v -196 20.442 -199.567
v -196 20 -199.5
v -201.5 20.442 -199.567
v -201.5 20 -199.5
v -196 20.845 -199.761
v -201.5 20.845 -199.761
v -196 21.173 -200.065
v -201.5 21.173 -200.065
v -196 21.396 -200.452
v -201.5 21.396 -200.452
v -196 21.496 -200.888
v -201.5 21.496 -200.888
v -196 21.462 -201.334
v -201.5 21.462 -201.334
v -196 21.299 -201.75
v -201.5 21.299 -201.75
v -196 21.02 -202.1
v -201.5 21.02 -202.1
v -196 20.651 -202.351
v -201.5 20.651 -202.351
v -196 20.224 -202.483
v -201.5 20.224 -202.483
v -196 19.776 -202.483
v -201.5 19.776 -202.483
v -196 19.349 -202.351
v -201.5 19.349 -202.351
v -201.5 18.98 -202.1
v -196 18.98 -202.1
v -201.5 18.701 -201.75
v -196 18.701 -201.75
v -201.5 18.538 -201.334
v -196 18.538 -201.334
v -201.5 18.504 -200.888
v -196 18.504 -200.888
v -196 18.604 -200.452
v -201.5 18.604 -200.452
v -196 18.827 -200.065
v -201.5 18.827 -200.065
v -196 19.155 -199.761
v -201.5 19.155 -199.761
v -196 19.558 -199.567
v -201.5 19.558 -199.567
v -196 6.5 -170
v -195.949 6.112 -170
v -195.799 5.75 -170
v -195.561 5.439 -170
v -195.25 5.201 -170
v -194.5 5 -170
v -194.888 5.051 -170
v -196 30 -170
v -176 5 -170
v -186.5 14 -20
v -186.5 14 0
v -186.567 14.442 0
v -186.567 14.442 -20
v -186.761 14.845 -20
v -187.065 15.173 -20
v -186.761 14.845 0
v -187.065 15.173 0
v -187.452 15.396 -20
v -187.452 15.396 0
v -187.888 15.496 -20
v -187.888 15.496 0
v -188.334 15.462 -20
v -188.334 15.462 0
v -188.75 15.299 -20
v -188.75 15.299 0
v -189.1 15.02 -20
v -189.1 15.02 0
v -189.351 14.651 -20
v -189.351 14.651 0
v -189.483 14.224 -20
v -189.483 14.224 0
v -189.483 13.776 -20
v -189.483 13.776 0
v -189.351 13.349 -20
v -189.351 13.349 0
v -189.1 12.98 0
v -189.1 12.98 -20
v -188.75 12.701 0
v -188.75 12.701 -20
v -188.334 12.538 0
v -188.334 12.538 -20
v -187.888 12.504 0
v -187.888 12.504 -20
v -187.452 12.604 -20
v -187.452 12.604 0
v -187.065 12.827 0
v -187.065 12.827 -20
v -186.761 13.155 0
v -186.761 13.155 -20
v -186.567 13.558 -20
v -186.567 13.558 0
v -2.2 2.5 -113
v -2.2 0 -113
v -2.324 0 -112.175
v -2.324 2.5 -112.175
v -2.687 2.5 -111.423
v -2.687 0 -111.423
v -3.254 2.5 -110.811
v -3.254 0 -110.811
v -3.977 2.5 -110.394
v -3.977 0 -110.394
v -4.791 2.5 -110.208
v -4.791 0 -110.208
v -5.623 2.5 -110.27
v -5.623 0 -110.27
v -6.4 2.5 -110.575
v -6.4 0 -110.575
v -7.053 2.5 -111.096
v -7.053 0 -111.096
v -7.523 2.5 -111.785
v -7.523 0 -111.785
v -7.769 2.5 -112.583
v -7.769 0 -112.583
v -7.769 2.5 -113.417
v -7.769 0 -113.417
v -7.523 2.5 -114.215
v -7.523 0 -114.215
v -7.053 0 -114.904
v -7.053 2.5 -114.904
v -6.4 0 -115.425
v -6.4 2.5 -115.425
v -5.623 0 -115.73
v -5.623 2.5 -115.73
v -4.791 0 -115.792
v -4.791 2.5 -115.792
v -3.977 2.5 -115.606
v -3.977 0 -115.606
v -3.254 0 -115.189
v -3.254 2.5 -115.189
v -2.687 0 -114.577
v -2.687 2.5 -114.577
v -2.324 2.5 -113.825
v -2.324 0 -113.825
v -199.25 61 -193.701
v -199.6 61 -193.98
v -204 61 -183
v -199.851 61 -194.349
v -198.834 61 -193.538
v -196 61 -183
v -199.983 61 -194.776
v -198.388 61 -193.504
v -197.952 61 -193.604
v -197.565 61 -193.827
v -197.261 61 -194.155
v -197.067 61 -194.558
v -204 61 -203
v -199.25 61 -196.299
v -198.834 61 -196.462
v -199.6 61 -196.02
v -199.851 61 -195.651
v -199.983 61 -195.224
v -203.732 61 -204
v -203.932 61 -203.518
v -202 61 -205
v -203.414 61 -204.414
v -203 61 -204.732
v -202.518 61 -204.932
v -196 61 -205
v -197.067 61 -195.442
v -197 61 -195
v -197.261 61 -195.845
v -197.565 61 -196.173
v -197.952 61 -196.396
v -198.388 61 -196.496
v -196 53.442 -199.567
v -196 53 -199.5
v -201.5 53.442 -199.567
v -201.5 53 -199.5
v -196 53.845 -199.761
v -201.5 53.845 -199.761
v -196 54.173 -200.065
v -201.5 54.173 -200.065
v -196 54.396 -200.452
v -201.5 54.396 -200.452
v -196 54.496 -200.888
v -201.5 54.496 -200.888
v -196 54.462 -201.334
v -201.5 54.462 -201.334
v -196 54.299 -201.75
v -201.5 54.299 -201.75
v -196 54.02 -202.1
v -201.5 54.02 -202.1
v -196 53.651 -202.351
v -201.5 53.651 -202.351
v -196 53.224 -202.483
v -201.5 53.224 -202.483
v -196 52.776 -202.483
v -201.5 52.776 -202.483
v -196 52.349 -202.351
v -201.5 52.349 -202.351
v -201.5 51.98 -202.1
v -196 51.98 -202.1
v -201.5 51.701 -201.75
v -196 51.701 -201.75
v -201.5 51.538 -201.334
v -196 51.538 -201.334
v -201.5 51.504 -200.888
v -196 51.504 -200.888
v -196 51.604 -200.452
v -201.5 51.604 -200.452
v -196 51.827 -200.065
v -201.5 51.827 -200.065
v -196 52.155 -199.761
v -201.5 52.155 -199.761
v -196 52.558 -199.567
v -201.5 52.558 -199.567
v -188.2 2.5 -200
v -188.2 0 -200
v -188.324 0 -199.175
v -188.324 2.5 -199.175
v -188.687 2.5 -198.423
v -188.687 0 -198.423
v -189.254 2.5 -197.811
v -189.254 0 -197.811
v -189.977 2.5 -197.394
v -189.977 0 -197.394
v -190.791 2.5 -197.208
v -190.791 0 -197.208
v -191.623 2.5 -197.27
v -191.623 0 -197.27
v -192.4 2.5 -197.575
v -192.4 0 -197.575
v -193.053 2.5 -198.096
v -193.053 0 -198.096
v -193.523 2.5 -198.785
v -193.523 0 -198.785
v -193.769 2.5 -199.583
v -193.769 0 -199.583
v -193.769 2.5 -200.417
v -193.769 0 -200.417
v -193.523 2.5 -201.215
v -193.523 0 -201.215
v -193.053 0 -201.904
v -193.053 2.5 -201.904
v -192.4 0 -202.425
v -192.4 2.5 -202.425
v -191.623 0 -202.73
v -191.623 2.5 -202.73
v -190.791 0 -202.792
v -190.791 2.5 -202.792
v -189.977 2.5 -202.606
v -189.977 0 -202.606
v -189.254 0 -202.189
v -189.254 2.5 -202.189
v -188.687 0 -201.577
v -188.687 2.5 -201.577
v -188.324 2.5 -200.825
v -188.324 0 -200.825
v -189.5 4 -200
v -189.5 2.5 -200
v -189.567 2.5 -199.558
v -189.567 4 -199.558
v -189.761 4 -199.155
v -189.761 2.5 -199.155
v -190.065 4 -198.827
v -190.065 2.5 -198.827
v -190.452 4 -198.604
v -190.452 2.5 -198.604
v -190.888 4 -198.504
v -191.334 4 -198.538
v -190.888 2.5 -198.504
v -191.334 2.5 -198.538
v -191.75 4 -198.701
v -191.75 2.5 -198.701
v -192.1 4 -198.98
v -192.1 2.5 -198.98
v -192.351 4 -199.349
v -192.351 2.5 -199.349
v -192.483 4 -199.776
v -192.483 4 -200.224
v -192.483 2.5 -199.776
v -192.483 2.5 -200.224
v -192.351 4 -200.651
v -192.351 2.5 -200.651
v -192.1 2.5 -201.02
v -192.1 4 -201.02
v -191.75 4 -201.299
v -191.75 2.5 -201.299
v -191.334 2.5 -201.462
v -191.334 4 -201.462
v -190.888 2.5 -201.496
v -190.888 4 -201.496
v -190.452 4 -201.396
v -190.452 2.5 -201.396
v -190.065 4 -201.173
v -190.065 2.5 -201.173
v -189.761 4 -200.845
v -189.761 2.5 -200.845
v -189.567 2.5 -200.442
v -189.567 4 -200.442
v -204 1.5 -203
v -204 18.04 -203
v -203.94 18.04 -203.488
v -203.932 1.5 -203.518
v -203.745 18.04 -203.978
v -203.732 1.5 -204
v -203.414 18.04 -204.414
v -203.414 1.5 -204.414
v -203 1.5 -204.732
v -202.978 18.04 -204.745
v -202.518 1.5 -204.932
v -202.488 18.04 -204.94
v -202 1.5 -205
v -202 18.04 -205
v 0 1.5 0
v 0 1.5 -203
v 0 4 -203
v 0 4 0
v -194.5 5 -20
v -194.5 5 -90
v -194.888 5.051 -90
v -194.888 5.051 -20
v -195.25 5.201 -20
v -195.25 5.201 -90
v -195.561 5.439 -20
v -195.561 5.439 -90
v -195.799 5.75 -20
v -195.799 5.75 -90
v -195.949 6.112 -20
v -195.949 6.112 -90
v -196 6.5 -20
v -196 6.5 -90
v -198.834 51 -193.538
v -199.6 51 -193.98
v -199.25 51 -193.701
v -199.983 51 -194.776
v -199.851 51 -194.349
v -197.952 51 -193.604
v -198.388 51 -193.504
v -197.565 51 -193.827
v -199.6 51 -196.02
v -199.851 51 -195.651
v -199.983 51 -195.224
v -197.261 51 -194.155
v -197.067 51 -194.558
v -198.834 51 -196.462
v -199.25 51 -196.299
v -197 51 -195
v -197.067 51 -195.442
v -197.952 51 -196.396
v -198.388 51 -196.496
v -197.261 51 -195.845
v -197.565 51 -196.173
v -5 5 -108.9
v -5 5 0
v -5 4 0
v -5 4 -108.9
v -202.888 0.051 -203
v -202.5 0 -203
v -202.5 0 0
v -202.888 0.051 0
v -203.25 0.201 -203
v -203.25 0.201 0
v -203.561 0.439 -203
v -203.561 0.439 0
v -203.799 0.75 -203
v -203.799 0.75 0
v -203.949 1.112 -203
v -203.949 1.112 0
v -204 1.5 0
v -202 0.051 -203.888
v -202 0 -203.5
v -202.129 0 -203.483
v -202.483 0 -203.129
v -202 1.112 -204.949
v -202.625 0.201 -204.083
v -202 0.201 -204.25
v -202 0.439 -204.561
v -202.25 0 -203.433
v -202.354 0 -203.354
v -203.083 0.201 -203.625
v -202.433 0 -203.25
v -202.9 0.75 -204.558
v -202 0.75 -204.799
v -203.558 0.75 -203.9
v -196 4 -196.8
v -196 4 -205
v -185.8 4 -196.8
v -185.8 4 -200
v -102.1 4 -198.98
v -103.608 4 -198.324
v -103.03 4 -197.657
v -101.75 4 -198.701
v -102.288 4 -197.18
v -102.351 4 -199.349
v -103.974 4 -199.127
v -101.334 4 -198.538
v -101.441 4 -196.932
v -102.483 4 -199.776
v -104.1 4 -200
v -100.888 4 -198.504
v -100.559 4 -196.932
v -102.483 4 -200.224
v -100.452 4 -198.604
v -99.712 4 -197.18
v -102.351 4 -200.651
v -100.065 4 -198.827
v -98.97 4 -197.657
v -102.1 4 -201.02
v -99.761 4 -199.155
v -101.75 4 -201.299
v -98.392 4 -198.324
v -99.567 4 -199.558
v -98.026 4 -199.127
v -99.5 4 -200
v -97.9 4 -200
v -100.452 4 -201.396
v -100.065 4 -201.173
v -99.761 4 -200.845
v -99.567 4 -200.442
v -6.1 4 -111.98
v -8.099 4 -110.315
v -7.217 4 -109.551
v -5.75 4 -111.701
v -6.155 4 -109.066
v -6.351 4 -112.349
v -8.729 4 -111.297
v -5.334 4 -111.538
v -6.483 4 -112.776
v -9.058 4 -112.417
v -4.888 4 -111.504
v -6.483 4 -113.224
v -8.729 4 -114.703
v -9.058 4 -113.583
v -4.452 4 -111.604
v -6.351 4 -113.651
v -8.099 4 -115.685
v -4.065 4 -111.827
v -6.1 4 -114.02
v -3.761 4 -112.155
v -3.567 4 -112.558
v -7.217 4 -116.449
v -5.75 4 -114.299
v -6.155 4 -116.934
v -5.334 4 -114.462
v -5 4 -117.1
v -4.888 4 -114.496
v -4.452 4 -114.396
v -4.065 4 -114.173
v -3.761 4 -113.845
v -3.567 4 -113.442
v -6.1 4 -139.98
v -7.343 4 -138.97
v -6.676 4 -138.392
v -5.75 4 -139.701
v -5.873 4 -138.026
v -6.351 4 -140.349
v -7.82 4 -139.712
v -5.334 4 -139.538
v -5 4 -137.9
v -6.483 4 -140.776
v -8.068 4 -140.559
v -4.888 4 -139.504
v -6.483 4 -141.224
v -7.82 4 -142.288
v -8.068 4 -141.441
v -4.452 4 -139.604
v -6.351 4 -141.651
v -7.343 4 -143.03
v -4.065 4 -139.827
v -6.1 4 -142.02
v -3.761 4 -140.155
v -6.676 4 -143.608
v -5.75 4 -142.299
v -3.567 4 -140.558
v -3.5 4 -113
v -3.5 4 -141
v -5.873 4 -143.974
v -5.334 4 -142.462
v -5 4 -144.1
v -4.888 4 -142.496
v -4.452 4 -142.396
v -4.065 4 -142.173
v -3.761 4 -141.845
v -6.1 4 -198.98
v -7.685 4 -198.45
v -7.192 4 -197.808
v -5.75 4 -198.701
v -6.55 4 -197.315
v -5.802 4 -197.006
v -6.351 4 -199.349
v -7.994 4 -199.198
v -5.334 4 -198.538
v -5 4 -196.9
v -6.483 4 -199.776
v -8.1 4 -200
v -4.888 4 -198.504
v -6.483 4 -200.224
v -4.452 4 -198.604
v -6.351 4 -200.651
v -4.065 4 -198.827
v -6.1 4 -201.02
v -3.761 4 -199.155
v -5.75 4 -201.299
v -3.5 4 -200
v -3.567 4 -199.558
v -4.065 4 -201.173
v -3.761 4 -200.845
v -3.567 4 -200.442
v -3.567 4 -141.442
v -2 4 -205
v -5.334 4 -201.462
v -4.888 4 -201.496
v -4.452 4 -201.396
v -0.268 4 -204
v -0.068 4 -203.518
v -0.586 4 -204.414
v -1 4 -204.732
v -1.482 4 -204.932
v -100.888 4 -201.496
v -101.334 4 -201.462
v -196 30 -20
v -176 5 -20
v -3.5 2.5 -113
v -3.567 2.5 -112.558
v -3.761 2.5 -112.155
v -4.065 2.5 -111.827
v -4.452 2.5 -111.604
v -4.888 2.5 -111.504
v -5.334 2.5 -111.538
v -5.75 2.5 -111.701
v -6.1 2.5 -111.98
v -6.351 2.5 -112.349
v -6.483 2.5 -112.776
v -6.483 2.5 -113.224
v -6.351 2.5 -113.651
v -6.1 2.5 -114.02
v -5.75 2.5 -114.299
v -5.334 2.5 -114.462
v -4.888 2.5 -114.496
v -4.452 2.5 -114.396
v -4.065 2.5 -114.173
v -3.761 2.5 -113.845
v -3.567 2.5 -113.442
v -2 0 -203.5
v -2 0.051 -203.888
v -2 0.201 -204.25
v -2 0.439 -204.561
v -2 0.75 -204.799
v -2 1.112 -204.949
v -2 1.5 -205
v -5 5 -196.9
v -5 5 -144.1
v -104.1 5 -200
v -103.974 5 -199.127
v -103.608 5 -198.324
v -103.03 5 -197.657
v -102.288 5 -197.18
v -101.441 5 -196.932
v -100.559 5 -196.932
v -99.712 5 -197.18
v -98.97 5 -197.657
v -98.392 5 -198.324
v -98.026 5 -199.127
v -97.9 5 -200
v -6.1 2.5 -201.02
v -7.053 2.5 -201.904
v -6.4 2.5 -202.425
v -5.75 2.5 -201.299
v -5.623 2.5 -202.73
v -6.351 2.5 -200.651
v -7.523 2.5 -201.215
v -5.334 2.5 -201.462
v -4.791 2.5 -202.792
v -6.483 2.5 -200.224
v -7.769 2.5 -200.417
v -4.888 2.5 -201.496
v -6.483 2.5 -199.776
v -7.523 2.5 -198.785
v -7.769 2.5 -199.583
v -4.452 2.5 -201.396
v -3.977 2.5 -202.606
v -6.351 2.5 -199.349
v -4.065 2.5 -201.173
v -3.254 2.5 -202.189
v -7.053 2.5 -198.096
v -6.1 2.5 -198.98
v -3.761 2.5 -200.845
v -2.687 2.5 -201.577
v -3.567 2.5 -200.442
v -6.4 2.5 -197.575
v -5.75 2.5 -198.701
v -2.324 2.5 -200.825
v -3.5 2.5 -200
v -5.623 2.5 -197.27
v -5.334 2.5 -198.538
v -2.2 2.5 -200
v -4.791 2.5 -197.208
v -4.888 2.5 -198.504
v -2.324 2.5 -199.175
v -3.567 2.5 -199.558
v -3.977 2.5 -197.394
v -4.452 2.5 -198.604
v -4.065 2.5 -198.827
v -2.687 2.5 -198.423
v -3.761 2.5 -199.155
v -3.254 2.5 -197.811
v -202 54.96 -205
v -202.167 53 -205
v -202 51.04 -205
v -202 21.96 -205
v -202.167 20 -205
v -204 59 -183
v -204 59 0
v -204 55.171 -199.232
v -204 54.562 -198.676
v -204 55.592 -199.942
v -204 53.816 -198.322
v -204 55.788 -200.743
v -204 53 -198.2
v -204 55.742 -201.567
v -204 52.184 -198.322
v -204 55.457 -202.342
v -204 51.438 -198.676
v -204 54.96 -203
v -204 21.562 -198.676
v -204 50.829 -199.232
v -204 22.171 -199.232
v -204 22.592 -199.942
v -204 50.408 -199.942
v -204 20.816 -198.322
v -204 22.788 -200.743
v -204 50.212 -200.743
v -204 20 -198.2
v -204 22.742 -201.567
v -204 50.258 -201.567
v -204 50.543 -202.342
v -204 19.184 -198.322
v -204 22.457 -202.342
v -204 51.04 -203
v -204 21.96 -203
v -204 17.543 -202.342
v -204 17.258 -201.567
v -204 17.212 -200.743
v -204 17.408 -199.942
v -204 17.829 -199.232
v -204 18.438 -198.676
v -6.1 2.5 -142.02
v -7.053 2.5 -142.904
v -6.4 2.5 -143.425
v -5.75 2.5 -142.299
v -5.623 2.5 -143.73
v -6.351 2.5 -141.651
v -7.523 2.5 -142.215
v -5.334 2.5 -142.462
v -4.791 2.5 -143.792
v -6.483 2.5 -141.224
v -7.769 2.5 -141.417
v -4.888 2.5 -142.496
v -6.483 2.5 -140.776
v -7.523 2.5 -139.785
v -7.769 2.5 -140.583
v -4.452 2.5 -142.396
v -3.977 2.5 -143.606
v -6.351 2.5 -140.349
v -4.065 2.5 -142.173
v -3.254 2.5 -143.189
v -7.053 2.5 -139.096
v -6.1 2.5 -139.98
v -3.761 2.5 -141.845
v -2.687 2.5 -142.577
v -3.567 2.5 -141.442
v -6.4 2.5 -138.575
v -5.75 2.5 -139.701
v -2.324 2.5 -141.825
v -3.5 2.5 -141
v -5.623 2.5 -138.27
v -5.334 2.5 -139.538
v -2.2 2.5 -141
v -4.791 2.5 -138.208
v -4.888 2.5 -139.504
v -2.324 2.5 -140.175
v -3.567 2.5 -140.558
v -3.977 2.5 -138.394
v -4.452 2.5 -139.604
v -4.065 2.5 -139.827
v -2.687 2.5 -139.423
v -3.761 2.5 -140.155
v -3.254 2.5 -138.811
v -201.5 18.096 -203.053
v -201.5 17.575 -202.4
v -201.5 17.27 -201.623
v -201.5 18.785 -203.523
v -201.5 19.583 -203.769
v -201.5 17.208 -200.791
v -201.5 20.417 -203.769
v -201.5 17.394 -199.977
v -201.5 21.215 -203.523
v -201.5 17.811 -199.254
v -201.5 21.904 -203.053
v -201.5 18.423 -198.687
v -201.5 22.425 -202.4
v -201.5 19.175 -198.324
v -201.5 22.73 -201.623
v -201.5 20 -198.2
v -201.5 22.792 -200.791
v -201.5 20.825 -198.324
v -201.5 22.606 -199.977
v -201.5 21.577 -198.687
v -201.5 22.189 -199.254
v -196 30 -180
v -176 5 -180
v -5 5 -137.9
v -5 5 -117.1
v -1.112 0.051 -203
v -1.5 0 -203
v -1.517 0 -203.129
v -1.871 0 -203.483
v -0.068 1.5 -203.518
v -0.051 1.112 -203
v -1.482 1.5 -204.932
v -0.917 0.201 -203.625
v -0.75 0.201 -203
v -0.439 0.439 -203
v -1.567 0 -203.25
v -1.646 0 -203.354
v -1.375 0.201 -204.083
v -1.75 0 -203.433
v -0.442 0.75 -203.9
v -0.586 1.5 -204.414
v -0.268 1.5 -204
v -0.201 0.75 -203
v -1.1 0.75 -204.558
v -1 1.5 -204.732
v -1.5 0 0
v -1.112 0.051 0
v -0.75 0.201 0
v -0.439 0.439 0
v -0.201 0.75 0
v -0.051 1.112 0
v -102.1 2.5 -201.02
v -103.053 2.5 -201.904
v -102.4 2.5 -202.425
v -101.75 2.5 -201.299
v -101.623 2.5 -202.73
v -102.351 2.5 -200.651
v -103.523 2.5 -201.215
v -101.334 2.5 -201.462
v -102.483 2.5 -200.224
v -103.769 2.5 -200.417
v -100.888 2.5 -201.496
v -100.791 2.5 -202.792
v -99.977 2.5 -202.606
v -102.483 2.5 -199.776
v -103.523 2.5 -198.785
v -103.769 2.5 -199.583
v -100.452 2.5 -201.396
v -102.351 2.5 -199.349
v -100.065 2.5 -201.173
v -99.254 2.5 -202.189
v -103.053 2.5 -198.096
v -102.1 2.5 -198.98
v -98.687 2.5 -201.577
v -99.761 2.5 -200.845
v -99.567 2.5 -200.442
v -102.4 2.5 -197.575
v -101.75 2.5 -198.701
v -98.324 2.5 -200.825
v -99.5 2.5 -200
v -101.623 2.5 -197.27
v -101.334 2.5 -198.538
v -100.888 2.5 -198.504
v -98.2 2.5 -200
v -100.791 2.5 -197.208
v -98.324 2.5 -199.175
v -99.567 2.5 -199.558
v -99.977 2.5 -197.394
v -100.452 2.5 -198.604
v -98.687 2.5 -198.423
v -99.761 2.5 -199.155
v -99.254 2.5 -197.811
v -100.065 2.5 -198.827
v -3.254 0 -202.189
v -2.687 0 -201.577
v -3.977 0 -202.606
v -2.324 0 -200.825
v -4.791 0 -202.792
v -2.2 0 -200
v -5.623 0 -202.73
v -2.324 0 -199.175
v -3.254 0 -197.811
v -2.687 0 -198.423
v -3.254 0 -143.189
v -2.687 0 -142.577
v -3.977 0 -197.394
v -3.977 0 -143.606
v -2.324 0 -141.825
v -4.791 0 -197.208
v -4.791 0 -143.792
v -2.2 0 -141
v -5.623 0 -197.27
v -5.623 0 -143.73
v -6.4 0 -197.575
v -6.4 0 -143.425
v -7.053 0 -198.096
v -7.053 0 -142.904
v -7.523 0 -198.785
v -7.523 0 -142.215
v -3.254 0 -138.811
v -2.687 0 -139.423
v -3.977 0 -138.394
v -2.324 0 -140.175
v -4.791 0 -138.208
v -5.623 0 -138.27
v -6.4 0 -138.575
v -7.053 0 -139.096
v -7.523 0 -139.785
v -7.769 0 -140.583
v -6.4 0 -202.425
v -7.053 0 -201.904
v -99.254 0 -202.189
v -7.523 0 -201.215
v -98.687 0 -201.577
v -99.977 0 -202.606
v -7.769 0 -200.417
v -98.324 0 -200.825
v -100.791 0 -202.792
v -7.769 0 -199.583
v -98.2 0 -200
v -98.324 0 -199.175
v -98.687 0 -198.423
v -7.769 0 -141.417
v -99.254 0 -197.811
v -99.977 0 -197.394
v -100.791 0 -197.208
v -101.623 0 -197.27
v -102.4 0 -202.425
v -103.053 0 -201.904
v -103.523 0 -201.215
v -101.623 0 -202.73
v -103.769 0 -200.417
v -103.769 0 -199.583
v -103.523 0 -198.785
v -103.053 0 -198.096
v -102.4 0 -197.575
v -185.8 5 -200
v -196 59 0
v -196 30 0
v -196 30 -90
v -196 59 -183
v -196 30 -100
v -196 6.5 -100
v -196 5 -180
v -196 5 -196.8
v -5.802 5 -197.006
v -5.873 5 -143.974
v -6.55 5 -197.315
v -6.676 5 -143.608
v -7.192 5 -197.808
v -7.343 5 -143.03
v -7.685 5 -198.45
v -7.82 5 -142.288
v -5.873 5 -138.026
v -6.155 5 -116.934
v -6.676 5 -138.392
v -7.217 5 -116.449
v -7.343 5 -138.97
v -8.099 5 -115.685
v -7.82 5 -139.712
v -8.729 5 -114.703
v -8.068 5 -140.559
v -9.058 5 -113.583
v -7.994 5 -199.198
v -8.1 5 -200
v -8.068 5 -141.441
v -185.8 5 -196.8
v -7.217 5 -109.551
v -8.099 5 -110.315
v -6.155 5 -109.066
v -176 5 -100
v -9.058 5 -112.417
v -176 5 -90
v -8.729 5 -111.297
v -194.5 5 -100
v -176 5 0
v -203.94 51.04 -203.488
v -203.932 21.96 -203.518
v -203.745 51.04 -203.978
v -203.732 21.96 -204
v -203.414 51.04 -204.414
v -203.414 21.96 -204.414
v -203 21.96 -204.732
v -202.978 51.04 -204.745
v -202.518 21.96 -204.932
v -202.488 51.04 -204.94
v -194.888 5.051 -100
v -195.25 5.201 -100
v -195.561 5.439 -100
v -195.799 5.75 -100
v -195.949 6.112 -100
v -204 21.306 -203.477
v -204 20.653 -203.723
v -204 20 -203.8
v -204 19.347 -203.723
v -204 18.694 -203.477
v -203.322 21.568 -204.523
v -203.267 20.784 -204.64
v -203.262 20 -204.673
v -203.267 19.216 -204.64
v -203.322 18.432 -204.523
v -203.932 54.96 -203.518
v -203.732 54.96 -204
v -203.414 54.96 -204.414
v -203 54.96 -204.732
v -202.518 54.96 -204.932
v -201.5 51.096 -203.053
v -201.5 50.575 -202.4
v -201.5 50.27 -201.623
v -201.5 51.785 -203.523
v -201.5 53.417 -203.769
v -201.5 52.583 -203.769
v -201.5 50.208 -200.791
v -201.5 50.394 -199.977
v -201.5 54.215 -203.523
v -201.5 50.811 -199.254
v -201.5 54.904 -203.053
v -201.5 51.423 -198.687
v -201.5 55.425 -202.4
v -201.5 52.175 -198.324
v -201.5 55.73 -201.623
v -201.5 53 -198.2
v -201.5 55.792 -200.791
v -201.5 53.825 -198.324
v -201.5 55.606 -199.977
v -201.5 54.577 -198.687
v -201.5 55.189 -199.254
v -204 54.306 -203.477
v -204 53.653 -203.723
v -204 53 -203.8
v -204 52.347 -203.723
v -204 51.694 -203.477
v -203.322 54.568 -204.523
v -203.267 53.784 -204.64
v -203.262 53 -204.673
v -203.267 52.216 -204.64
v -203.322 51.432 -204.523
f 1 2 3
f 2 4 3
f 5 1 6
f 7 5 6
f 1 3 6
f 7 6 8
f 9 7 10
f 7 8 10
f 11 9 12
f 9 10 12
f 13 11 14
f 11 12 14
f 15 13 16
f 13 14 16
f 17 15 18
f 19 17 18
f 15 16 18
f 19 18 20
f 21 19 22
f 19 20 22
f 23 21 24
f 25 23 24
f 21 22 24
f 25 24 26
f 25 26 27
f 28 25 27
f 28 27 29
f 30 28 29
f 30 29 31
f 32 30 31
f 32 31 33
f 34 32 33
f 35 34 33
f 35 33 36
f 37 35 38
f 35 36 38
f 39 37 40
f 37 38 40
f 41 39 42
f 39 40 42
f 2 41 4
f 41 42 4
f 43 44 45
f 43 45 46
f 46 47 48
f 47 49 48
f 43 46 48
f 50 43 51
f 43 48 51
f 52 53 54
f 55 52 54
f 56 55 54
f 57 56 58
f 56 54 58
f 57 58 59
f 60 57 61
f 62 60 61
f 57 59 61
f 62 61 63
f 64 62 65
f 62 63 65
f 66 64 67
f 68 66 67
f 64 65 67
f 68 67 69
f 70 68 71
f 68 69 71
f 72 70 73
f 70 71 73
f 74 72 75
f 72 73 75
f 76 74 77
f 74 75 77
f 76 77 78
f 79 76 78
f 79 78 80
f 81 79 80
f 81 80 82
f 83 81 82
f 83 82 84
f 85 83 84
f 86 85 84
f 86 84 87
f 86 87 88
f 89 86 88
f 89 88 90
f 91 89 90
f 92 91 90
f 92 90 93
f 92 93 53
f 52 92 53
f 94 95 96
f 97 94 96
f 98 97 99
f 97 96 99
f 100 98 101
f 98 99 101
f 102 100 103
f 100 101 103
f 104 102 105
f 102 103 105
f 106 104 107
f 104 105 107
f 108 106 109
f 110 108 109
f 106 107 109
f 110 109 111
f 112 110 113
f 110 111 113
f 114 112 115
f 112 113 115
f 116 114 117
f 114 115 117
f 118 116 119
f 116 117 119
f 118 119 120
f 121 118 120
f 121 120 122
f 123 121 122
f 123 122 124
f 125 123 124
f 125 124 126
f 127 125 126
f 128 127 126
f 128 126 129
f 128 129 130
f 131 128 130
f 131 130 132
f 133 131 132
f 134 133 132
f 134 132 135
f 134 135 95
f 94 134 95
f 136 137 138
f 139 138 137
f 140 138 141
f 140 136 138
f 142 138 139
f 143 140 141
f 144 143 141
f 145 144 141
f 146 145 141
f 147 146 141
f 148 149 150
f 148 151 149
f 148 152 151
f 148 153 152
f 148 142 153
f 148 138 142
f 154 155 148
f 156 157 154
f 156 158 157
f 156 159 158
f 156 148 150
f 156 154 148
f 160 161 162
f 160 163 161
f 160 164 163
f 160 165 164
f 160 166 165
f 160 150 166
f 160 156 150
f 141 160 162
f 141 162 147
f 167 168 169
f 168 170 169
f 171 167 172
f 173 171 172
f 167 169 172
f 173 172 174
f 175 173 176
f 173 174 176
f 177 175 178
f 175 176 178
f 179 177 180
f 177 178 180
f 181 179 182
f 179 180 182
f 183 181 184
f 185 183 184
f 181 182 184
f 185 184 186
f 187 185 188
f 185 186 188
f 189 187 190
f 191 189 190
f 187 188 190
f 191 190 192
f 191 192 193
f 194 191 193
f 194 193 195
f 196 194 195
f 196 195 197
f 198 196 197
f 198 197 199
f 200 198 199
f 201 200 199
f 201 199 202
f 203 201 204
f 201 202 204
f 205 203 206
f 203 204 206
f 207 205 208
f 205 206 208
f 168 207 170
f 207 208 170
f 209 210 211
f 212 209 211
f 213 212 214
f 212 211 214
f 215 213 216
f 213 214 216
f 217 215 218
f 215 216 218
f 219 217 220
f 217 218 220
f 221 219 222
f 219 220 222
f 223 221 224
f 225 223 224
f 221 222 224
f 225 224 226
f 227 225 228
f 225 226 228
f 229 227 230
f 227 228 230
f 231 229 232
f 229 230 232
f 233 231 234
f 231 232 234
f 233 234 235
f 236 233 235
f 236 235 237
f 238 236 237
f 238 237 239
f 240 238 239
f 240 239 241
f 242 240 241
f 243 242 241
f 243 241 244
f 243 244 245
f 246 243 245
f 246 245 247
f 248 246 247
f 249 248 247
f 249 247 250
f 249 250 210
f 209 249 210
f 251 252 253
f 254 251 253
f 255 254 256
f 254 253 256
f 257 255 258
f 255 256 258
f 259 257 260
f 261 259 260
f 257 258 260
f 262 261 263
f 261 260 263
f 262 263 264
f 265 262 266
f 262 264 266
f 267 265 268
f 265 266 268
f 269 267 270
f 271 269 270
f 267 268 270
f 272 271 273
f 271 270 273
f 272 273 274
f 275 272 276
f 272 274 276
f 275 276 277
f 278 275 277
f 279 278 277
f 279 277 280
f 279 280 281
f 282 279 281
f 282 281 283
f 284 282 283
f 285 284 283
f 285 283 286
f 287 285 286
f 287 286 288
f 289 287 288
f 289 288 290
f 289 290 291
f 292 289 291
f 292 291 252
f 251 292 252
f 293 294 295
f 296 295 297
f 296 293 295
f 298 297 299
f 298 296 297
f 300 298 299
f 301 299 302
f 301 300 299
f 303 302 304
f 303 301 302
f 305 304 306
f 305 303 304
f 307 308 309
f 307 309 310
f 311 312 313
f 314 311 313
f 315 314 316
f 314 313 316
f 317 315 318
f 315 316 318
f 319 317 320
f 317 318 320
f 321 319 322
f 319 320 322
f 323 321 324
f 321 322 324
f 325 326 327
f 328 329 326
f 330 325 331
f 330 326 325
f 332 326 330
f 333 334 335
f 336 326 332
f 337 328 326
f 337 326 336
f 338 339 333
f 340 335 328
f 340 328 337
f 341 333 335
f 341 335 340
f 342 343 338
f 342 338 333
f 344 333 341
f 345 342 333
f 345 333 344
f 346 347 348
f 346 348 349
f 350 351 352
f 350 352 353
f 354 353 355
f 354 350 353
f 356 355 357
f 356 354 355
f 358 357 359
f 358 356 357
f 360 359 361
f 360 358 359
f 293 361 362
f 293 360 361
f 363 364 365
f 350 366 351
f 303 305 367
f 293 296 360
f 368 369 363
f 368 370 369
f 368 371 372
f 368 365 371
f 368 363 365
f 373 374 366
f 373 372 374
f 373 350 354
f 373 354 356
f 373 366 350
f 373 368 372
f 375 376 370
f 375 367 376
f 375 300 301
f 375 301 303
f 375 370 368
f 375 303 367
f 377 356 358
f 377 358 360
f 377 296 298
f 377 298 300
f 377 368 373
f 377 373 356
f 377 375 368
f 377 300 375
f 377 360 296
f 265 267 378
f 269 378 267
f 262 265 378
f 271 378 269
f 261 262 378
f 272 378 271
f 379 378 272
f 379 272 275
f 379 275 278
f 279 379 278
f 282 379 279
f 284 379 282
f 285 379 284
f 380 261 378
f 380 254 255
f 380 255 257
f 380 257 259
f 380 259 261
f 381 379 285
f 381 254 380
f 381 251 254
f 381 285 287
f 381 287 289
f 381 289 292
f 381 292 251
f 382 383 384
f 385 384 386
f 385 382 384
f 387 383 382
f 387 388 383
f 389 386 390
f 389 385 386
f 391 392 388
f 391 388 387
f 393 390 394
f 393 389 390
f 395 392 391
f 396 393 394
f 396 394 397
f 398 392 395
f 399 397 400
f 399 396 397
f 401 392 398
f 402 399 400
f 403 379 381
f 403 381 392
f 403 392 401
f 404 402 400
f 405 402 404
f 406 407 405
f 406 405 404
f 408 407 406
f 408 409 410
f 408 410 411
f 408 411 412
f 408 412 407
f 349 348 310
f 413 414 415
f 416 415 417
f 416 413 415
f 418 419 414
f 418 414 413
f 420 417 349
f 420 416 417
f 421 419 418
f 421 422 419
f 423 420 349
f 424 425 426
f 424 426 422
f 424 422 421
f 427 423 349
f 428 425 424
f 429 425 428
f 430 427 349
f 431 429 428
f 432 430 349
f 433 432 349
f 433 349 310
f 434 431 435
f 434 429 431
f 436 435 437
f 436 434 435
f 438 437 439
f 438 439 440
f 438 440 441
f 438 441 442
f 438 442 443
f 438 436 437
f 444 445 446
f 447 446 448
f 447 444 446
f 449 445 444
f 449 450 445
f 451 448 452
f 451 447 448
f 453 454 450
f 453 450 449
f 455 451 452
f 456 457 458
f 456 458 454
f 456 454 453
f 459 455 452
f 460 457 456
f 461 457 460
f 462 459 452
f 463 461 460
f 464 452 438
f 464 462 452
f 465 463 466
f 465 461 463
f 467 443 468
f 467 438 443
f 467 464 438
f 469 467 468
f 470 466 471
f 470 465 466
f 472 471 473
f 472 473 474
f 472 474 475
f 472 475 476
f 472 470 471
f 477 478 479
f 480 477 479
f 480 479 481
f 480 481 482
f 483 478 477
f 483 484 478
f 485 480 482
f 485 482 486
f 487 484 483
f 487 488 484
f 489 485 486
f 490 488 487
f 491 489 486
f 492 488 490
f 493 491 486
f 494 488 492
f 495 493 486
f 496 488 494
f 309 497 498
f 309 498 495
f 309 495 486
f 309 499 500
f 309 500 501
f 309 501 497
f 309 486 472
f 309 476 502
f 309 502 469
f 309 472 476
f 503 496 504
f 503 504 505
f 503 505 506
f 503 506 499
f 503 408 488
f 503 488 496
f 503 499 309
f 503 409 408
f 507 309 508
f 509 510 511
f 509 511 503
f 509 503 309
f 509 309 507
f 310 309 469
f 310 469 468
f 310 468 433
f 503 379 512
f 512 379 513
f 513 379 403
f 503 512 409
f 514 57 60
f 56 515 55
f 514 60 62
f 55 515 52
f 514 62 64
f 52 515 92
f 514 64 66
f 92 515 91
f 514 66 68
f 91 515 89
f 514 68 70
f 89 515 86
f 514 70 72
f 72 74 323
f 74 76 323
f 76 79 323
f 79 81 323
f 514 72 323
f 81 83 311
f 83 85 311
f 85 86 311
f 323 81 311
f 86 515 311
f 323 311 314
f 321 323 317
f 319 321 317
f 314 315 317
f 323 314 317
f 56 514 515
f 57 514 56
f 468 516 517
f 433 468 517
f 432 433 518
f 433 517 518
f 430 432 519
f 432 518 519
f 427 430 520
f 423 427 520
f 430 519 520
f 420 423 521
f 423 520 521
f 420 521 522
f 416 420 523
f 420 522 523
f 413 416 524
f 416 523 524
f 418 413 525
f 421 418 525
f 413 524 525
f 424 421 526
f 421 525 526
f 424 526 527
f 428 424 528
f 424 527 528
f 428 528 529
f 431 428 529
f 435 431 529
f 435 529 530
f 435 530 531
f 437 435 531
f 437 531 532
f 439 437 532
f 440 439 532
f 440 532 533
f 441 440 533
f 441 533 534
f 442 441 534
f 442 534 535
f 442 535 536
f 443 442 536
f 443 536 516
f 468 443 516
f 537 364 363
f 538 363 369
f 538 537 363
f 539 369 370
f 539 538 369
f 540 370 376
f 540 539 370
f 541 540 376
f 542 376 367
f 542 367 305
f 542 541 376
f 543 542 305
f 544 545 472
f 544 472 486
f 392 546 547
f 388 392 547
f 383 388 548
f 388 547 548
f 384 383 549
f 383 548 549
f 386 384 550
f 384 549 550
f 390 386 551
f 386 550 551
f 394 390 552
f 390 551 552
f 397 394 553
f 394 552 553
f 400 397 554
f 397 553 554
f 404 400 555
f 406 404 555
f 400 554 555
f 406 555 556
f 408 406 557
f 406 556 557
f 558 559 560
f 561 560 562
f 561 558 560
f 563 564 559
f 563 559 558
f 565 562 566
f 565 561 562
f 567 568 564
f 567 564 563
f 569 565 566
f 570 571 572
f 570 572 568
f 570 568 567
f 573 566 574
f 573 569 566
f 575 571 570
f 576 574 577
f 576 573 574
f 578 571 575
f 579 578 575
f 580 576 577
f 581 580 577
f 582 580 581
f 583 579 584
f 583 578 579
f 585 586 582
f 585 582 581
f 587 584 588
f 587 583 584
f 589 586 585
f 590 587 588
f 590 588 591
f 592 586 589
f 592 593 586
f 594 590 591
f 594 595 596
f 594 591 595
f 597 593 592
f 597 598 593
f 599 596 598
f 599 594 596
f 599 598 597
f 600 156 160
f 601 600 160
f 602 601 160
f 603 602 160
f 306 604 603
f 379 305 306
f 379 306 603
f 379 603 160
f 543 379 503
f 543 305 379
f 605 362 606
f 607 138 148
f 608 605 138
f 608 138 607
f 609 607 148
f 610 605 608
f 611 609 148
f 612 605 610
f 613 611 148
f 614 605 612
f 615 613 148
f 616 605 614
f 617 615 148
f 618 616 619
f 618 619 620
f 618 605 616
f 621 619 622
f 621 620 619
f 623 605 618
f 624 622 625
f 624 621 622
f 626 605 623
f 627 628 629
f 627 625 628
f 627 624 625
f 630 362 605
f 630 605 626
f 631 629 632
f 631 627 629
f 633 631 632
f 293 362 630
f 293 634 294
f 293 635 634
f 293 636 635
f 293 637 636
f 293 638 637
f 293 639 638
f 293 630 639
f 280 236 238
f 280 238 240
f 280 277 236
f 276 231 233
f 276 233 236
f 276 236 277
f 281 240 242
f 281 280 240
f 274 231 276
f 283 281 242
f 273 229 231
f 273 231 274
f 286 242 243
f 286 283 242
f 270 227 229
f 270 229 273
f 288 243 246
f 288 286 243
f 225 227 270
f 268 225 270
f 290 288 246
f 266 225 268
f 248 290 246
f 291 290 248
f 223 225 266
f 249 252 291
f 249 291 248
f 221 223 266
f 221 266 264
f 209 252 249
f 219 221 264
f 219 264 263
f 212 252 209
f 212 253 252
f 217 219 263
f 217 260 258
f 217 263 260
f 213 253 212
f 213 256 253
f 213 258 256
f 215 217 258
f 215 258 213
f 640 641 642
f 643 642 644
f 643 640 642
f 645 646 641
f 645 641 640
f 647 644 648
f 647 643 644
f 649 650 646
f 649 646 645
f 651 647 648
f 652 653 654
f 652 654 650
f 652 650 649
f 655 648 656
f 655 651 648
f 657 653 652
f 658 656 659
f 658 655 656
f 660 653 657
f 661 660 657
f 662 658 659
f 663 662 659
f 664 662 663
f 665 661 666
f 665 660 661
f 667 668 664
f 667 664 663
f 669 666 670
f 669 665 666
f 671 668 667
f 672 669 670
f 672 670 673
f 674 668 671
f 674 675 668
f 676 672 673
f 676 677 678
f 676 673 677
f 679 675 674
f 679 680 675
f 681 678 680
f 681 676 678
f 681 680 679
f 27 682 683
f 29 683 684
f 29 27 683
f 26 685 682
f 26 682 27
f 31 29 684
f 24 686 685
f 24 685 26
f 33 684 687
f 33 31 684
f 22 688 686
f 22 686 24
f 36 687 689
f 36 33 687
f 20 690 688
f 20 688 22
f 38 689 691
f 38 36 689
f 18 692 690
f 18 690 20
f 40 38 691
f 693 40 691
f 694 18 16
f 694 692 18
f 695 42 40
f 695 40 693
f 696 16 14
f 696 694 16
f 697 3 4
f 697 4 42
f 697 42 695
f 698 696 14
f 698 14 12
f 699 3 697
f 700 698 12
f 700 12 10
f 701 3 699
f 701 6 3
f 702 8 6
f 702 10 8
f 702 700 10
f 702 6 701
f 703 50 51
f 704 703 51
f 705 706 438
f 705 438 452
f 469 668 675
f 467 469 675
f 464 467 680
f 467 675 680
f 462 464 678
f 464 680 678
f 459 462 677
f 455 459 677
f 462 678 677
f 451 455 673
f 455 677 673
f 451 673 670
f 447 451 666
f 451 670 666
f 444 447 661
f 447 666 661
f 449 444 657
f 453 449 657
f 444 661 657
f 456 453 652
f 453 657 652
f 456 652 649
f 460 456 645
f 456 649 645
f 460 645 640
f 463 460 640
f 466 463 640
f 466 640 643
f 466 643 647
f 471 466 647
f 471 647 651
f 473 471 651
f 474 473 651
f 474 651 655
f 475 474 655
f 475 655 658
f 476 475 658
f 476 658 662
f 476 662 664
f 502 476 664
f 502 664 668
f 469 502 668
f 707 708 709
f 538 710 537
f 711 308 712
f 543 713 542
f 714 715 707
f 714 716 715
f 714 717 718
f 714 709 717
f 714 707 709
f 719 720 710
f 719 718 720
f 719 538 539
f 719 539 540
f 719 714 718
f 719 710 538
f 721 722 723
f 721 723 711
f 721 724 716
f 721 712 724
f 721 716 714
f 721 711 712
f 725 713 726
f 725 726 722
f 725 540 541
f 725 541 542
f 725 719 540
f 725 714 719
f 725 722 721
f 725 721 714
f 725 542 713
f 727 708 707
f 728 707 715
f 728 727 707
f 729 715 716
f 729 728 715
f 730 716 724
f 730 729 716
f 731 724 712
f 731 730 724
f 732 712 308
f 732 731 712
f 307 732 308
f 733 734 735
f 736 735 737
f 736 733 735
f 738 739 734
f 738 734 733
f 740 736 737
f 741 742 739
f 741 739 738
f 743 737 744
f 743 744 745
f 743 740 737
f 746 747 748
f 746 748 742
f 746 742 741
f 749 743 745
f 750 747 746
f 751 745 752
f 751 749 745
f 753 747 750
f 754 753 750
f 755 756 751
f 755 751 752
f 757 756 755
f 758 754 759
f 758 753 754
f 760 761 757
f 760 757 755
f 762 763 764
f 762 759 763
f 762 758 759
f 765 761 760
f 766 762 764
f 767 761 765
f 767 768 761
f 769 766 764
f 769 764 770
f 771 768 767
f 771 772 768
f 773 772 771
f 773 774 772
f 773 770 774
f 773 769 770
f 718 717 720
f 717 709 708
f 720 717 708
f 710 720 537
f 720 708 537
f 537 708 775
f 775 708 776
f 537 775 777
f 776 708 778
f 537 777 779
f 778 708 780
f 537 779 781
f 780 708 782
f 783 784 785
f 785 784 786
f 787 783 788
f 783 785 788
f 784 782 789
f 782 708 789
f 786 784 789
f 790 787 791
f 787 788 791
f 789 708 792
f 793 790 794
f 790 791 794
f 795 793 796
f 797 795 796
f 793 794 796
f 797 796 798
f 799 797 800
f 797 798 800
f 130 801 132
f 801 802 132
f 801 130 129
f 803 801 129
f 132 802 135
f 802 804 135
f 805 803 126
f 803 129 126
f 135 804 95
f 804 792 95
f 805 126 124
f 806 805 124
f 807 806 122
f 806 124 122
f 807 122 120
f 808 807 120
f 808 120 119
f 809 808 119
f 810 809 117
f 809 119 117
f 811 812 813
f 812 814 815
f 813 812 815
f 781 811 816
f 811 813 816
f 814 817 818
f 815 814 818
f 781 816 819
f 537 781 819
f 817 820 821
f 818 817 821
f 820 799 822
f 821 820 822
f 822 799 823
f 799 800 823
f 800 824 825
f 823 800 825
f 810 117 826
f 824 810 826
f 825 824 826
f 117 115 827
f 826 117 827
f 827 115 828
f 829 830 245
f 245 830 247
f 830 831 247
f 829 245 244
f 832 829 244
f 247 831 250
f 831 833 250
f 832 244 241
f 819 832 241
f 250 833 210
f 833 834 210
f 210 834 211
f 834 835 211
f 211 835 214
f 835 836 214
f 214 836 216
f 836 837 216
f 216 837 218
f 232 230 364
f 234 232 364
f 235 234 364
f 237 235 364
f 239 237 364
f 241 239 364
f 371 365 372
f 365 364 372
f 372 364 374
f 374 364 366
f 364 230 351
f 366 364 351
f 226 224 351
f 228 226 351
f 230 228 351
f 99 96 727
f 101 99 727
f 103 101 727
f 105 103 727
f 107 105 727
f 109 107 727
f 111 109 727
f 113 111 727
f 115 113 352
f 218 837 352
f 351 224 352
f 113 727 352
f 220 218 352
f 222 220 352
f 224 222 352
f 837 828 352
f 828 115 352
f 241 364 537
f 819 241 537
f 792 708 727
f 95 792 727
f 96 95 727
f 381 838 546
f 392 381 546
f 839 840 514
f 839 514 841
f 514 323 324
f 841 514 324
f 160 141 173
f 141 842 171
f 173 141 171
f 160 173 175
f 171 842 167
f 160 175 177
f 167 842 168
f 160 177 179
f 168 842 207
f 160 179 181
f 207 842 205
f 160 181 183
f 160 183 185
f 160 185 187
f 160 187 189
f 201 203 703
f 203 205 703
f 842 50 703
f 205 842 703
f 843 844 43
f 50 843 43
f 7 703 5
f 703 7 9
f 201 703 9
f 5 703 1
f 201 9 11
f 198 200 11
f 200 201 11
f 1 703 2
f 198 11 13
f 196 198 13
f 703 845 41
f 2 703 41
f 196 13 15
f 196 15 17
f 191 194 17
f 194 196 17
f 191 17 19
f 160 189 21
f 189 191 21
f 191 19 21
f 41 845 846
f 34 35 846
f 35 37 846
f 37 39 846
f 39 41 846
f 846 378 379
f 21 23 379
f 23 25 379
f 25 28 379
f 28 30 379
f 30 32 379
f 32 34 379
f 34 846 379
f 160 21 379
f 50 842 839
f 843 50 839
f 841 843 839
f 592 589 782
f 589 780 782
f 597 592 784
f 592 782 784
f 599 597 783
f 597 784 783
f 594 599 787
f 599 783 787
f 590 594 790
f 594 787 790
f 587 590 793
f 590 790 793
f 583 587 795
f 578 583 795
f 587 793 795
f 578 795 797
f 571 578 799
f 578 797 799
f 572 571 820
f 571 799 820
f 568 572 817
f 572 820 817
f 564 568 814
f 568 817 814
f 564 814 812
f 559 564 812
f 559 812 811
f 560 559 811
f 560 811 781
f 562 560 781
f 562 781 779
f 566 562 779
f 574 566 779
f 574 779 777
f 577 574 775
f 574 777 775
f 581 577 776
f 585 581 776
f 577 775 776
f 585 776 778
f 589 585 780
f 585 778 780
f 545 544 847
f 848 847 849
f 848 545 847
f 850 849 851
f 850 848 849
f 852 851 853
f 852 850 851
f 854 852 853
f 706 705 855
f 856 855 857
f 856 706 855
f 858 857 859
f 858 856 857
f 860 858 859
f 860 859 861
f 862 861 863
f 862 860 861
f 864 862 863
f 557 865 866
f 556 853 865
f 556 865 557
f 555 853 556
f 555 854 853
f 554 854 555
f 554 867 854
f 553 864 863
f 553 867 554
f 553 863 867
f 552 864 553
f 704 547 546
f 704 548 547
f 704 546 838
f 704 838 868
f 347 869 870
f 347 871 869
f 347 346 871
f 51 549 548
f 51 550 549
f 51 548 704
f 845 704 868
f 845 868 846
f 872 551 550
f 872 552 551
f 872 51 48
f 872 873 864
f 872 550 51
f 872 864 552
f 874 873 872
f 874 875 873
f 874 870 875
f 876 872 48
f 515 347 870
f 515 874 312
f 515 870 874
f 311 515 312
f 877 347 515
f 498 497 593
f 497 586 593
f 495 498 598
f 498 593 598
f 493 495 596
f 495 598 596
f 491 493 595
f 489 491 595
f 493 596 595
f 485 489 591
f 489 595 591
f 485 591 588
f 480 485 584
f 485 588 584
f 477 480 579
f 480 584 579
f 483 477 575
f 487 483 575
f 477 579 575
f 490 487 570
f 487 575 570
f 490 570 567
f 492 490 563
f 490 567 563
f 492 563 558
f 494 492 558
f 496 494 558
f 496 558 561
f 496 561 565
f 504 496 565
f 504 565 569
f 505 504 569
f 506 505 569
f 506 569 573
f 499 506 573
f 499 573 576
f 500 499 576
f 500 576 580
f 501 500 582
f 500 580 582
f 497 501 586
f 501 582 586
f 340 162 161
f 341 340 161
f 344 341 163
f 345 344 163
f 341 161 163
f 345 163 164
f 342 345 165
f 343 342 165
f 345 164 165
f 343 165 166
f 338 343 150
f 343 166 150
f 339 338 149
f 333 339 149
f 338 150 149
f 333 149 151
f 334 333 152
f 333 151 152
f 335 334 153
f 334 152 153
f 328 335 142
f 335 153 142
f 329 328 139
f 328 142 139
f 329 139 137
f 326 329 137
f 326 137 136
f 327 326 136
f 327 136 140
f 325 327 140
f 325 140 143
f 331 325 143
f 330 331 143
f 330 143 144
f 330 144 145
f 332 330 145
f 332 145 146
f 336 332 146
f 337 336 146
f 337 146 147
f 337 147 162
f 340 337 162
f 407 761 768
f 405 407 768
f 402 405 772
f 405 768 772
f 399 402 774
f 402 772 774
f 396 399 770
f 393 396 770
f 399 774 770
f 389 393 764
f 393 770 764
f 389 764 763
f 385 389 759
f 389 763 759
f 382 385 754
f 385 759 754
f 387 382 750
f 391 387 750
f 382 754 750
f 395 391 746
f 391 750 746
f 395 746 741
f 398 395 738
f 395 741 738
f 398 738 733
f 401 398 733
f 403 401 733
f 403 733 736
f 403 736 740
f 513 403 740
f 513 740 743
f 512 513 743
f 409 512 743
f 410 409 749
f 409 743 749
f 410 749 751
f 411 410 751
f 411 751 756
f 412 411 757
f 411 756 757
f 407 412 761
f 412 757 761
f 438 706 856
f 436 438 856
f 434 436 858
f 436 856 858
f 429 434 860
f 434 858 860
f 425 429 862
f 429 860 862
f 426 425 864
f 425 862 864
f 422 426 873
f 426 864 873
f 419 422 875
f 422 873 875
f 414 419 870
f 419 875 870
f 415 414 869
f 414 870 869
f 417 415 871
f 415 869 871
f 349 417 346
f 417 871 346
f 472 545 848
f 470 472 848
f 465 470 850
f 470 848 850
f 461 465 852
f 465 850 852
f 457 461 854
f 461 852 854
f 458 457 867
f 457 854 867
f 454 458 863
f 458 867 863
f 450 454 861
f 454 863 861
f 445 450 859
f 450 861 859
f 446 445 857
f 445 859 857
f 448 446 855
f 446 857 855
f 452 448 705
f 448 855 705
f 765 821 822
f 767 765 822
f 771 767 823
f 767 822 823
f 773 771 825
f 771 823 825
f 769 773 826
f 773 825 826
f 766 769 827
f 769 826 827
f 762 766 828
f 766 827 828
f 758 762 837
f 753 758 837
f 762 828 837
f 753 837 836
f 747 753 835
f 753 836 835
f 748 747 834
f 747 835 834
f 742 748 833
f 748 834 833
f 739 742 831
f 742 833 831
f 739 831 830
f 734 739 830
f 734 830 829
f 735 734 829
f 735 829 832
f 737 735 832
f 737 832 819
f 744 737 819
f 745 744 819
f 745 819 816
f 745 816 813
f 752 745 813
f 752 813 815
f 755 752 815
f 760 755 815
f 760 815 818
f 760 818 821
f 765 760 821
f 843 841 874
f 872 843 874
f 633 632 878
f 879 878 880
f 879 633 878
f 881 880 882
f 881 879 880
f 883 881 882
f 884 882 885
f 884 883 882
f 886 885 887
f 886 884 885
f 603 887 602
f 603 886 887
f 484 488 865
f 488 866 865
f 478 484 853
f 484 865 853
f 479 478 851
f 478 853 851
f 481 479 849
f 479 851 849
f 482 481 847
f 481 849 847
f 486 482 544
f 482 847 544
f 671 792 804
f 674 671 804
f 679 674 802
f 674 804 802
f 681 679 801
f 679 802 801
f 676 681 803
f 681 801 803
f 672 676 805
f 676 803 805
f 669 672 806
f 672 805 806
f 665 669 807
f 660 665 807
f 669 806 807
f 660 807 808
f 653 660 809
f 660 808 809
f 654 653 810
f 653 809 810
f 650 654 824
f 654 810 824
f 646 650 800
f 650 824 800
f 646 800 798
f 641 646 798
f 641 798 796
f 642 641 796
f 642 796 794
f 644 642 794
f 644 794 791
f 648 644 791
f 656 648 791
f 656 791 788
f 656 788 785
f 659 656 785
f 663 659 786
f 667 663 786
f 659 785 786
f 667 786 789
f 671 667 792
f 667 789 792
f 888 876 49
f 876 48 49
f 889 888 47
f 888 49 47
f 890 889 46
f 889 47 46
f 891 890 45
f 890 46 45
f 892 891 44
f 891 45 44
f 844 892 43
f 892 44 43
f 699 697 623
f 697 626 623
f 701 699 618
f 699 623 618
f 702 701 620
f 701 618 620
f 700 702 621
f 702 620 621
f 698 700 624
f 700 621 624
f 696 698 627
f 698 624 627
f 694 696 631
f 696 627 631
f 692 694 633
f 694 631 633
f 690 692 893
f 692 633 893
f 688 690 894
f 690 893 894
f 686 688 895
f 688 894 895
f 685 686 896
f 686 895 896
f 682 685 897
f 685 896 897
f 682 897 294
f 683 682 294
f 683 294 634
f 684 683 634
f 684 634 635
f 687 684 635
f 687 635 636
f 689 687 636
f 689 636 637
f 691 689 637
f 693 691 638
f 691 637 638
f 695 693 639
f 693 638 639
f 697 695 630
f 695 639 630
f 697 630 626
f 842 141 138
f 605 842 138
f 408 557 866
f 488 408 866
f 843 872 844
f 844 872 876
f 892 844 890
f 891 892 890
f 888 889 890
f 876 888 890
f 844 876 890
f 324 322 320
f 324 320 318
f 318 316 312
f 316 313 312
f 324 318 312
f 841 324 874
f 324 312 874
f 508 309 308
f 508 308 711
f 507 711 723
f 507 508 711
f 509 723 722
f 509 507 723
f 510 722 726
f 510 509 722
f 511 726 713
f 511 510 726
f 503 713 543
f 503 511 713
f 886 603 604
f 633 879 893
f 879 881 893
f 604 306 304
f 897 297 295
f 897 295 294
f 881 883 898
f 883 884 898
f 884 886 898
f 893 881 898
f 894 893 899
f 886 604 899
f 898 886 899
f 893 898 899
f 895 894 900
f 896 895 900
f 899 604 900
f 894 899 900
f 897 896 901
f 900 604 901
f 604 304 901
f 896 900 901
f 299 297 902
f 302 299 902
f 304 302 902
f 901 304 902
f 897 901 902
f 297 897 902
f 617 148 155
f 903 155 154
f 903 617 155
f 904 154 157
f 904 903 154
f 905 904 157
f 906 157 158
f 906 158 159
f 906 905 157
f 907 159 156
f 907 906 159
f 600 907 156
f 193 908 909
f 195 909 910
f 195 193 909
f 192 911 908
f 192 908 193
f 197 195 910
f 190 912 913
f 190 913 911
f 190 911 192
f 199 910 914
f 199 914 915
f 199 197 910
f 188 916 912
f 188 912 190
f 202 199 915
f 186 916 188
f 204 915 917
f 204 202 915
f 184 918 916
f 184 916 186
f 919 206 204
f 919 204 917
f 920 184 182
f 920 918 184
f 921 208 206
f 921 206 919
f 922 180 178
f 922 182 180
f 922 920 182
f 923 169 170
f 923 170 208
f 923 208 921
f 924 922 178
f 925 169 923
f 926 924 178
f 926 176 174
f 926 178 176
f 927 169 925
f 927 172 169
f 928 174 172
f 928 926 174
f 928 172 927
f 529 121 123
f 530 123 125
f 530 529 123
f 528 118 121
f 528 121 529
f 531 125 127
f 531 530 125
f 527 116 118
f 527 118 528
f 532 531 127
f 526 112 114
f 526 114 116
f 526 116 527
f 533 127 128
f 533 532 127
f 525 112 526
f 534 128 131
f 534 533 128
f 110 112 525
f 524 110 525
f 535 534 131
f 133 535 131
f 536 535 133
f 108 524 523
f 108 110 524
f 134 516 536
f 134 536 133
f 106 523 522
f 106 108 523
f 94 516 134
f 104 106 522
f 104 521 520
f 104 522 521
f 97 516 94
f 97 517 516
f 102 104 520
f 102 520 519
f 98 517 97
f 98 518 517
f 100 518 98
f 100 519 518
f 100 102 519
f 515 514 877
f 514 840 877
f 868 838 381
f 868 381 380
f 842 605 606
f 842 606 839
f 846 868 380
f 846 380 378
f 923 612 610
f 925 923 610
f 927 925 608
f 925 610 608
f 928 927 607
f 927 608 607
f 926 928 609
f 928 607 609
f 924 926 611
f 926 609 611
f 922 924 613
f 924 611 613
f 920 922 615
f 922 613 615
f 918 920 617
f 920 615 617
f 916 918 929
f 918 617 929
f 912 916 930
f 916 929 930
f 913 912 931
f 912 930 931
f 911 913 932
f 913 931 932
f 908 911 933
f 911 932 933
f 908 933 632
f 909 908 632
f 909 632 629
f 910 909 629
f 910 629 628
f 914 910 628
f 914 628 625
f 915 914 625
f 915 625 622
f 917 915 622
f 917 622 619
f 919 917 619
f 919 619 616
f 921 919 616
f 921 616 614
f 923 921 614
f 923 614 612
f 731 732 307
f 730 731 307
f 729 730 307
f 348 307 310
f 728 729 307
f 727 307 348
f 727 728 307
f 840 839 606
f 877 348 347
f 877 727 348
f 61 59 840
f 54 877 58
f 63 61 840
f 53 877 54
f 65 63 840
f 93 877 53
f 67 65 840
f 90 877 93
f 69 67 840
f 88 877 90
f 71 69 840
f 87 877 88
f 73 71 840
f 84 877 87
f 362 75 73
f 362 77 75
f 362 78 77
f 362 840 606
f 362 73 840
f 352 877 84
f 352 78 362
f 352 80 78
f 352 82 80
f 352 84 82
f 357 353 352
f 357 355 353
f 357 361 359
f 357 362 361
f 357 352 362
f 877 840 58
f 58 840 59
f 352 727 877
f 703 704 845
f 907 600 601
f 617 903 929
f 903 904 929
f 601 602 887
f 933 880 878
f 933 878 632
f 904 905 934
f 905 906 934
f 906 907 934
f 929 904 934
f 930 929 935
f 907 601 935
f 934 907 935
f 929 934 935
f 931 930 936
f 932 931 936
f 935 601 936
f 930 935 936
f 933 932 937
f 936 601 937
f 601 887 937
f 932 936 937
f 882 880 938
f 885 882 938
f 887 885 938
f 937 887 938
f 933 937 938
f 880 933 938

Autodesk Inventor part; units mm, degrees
ref_plane "YZ Plane" through (0, 0, 0) normal (1, 0, 0) x (0, 1, 0)
ref_plane "XZ Plane" through (0, 0, 0) normal (0, 1, 0) x (-1, 0, 0)
ref_plane "XY Plane" through (0, 0, 0) normal (0, 0, 1) x (1, 0, 0)
sketch "スケッチ1" plane through (0, 0, 0) normal (0, 1, 0) x (-1, 0, 0)
  line L0 (0, 0) -> (204, 0)
  line L1 (204, 0) -> (204, -205)
  line L2 (204, -205) -> (0, -205)
  line L3 (0, -205) -> (0, 0)
  dimension "d0" = 204
  dimension "d1" = 205
extrude "押し出し1" add sketch "スケッチ1" along normal blind 5
sketch "スケッチ2" plane through (0, 5, 0) normal (0, 1, 0) x (1, 0, 0)
  line L0 (-204, 205) -> (-204, 0) projected
  line L1 (0, 205) -> (-204, 205) projected
  line L2 (-204, 0) -> (-196, 0)
  line L3 (-196, 0) -> (-196, 205)
  line L4 (-196, 205) -> (-204, 205)
  line L5 (-204, 205) -> (-204, 0)
  point P0 (0, 0)
  dimension "d4" = 8
extrude "押し出し2" add sketch "スケッチ2" along normal blind 56
sketch "スケッチ3" plane through (0, 61, 0) normal (0, 1, 0) x (1, 0, 0)
  line L0 (-204, 205) -> (-204, 0) projected
  line L1 (-196, 0) -> (-196, 205) projected
  line L2 (-204, 0) -> (-196, 0)
  line L3 (-196, 0) -> (-196, 183)
  line L4 (-196, 183) -> (-204, 183)
  line L5 (-204, 183) -> (-204, 0)
  line L6 (-196, 205) -> (-204, 205) projected
  point P0 (0, 0)
  point P1 (-200, 183)
  dimension "d7" = 22
extrude "押し出し3" cut sketch "スケッチ3" against normal blind 2 contours L4 L1 L2 L0
sketch "スケッチ4" plane through (0, 61, 0) normal (0, 1, 0) x (1, 0, 0)
  circle A0 centre (-198.5, 195) radius 1.5
  line L0 (-196, 205) -> (-204, 205) projected
  line L1 (-196, 183) -> (-196, 205) projected
  line L2 (-204, 205) -> (-204, 183) projected
  point P0 (0, 0)
  dimension "d10" = 3
  dimension "d11" = 10
  dimension "d13" = 5.5
extrude "押し出し4" cut sketch "スケッチ4" against normal blind 10
sketch "スケッチ5" plane through (-204, 0, -205) normal (-1, 0, 0) x (0, 0, 1)
  circle A0 centre (4, 53) radius 1.5
  circle A1 centre (4, 20) radius 1.5
  line L0 (0, 61) -> (22, 61) projected
  line L1 (0, 0) -> (0, 61) projected
  point P0 (205, 0)
  dimension "d16" = 3
  dimension "d17" = 3
  dimension "d18" = 8
  dimension "d19" = 33
  dimension "d24" = 4
extrude "押し出し5" cut sketch "スケッチ5" against normal blind 10
sketch "スケッチ6" plane through (-204, 0, -205) normal (-1, 0, 0) x (0, 0, 1)
  circle A0 centre (4, 53) radius 1.5 projected
  circle A1 centre (4, 53) radius 2.8
  circle A2 centre (4, 20) radius 1.5 projected
  circle A3 centre (4, 20) radius 2.8
  point P0 (205, 0)
  dimension "d22" = 5.6
  dimension "d23" = 5.6
extrude "押し出し6" cut sketch "スケッチ6" against normal blind 2.5
sketch "スケッチ7" plane through (0, 0, 0) normal (0, -1, 0) x (1, 0, 0)
  circle A0 centre (-191, -200) radius 1.5
  circle A1 centre (-101, -200) radius 1.5
  circle A2 centre (-5, -200) radius 1.5
  line L0 (-204, 0) -> (0, 0) projected
  line L1 (0, 0) -> (0, -205) projected
  circle A3 centre (-5, -141) radius 1.5
  circle A4 centre (-5, -113) radius 1.5
  line L2 (0, -205) -> (-204, -205) projected
  dimension "d27" = 3
  dimension "d28" = 3
  dimension "d29" = 3
  dimension "d31" = 5
  dimension "d32" = 96
  dimension "d33" = 90
  dimension "d34" = 3
  dimension "d36" = 3
  dimension "d37" = 5
  dimension "d38" = 59
  dimension "d39" = 28
extrude "押し出し7" cut sketch "スケッチ7" against normal through all
sketch "スケッチ8" plane through (0, 0, 0) normal (0, -1, 0) x (1, 0, 0)
  circle A0 centre (-5, -113) radius 1.5 projected
  circle A1 centre (-5, -113) radius 2.8
  circle A2 centre (-5, -141) radius 1.5 projected
  circle A3 centre (-5, -141) radius 2.8
  circle A4 centre (-5, -200) radius 1.5 projected
  circle A5 centre (-5, -200) radius 2.8
  circle A6 centre (-101, -200) radius 1.5 projected
  circle A7 centre (-101, -200) radius 2.8
  circle A8 centre (-191, -200) radius 1.5 projected
  circle A9 centre (-191, -200) radius 2.8
  point P0 (0, 0)
  dimension "d42" = 5.6
  dimension "d43" = 5.6
  dimension "d44" = 5.6
  dimension "d45" = 5.6
  dimension "d46" = 5.6
extrude "押し出し8" cut sketch "スケッチ8" against normal blind 2.5
sketch "スケッチ9" plane through (0, 5, 0) normal (0, 1, 0) x (1, 0, 0)
  line L0 (0, 205) -> (-204, 205) projected
  line L1 (0, 0) -> (-5, 0)
  line L2 (-5, 0) -> (-5, 205)
  line L3 (-5, 205) -> (0, 205)
  line L4 (0, 205) -> (0, 0)
  line L5 (-196, 183) -> (-196, 205) projected
  line L6 (0, 205) -> (-196, 205)
  line L7 (-196, 205) -> (-196, 200)
  line L8 (-196, 200) -> (0, 200)
  line L9 (0, 200) -> (0, 205)
  circle A0 centre (-5, 141) radius 1.5 projected
  circle A1 centre (-5, 141) radius 3.1
  circle A2 centre (-5, 113) radius 1.5 projected
  circle A3 centre (-5, 113) radius 4.1
  circle A4 centre (-5, 200) radius 1.5 projected
  circle A5 centre (-5, 200) radius 3.1
  line L10 (-196, 205) -> (-185.8, 205)
  line L11 (-185.8, 205) -> (-185.8, 196.8)
  line L12 (-185.8, 196.8) -> (-196, 196.8)
  line L13 (-196, 196.8) -> (-196, 205)
  circle A6 centre (-101, 200) radius 1.5 projected
  circle A7 centre (-101, 200) radius 3.1
  point P0 (-5, 137.9)
  point P1 (-5, 117.1)
  point P2 (-5, 108.9)
  point P3 (-185.8, 200)
  point P4 (-8.1, 200)
  point P5 (-5, 196.9)
  point P6 (-5, 144.1)
  point P7 (-104.1, 200)
  point P8 (-97.9, 200)
  point P9 (-99.5, 200)
  point P10 (-102.5, 200)
  dimension "d49" = 5
  dimension "d50" = 5
  dimension "d51" = 6.2
  dimension "d52" = 8.2
  dimension "d53" = 6.2
  dimension "d54" = 10.2
  dimension "d55" = 8.2
  dimension "d58" = 6.2
extrude "押し出し9" cut sketch "スケッチ9" against normal blind 1 contours L4 L8 A5 L2 L0 | L2 A5 L8 A7 L11 L0 | L4 L1 L2 A3 A1 A5 L8 | L11 L8 L5 L0 | A5 L8 A4 L2 | L2 A4 L8 A5 | A5 L2 A4 L8 | L11 L12 L5 L8 | A4 L8 L2 | L2 L8 A4 | L8 A4 L2 A5 | A4 L2 L8 | A7 L8 A6 | L8 A6 A7 | L2 A4 L8 | A3 L2 A2 | L2 A2 A3 | A1 L2 A0 | L2 A0 A1 | A6 L8 | A2 L2 | L2 A2 | A0 L2 | L2 A0 picked at (-100.9397, 200.4964)
sketch "スケッチ10" plane through (0, 5, 0) normal (0, 1, 0) x (1, 0, 0)
  line L0 (-196, 0) -> (-176, 0)
  line L1 (-176, 0) -> (-176, 20)
  line L2 (-176, 20) -> (-196, 20)
  line L3 (-196, 20) -> (-196, 0)
  line L4 (-196, 196.8) -> (-196, 0) projected
  line L5 (-196, 90) -> (-176, 90)
  line L6 (-176, 90) -> (-176, 100)
  line L7 (-176, 100) -> (-196, 100)
  line L8 (-196, 100) -> (-196, 90)
  line L9 (-196, 170) -> (-176, 170)
  line L10 (-176, 170) -> (-176, 180)
  line L11 (-176, 180) -> (-196, 180)
  line L12 (-196, 180) -> (-196, 170)
  point P0 (0, 0)
  dimension "d59" = 20
  dimension "d60" = 20
  dimension "d61" = 20
  dimension "d62" = 10
  dimension "d63" = 70
  dimension "d64" = 20
  dimension "d65" = 10
  dimension "d66" = 70
extrude "押し出し10" add sketch "スケッチ10" along normal blind 25
sketch "スケッチ11" plane through (-204, 0, 0) normal (0, 0, 1) x (1, 0, 0)
  line L0 (8, 30) -> (8, 5) projected
  line L1 (28, 5) -> (28, 30) projected
  line L2 (8, 30) -> (28, 5)
  line L3 (28, 5) -> (28, 30)
  line L4 (28, 30) -> (8, 30)
  point P0 (204, 0)
extrude "押し出し11" cut sketch "スケッチ11" against normal through all
sketch "スケッチ12" plane through (-204, 0, 0) normal (0, 0, 1) x (1, 0, 0)
  circle A0 centre (16, 14) radius 1.5
  line L0 (0, 0) -> (0, 59) projected
  line L1 (8, 30) -> (8, 5) projected
  line L2 (8, 5) -> (28, 5) projected
  point P0 (204, 0)
  dimension "d71" = 3
  dimension "d73" = 8
  dimension "d74" = 9
extrude "押し出し12" cut sketch "スケッチ12" against normal blind 25
fillet "フィレット1" radius 2 2 edges at (-204, 30.5, -205) (0, 2, -205)
fillet "フィレット2" radius 1.5 4 edges at (-203.4142, 0, -204.4142) (-102, 0, -205) (-204, 0, -101.5) (0, 0, -101.5)
fillet "フィレット3" radius 1.5 2 edges at (-196, 5, -135) (-196, 5, -55)
properties part number "オンゲキボタン_bottom_right_3D プリント"
